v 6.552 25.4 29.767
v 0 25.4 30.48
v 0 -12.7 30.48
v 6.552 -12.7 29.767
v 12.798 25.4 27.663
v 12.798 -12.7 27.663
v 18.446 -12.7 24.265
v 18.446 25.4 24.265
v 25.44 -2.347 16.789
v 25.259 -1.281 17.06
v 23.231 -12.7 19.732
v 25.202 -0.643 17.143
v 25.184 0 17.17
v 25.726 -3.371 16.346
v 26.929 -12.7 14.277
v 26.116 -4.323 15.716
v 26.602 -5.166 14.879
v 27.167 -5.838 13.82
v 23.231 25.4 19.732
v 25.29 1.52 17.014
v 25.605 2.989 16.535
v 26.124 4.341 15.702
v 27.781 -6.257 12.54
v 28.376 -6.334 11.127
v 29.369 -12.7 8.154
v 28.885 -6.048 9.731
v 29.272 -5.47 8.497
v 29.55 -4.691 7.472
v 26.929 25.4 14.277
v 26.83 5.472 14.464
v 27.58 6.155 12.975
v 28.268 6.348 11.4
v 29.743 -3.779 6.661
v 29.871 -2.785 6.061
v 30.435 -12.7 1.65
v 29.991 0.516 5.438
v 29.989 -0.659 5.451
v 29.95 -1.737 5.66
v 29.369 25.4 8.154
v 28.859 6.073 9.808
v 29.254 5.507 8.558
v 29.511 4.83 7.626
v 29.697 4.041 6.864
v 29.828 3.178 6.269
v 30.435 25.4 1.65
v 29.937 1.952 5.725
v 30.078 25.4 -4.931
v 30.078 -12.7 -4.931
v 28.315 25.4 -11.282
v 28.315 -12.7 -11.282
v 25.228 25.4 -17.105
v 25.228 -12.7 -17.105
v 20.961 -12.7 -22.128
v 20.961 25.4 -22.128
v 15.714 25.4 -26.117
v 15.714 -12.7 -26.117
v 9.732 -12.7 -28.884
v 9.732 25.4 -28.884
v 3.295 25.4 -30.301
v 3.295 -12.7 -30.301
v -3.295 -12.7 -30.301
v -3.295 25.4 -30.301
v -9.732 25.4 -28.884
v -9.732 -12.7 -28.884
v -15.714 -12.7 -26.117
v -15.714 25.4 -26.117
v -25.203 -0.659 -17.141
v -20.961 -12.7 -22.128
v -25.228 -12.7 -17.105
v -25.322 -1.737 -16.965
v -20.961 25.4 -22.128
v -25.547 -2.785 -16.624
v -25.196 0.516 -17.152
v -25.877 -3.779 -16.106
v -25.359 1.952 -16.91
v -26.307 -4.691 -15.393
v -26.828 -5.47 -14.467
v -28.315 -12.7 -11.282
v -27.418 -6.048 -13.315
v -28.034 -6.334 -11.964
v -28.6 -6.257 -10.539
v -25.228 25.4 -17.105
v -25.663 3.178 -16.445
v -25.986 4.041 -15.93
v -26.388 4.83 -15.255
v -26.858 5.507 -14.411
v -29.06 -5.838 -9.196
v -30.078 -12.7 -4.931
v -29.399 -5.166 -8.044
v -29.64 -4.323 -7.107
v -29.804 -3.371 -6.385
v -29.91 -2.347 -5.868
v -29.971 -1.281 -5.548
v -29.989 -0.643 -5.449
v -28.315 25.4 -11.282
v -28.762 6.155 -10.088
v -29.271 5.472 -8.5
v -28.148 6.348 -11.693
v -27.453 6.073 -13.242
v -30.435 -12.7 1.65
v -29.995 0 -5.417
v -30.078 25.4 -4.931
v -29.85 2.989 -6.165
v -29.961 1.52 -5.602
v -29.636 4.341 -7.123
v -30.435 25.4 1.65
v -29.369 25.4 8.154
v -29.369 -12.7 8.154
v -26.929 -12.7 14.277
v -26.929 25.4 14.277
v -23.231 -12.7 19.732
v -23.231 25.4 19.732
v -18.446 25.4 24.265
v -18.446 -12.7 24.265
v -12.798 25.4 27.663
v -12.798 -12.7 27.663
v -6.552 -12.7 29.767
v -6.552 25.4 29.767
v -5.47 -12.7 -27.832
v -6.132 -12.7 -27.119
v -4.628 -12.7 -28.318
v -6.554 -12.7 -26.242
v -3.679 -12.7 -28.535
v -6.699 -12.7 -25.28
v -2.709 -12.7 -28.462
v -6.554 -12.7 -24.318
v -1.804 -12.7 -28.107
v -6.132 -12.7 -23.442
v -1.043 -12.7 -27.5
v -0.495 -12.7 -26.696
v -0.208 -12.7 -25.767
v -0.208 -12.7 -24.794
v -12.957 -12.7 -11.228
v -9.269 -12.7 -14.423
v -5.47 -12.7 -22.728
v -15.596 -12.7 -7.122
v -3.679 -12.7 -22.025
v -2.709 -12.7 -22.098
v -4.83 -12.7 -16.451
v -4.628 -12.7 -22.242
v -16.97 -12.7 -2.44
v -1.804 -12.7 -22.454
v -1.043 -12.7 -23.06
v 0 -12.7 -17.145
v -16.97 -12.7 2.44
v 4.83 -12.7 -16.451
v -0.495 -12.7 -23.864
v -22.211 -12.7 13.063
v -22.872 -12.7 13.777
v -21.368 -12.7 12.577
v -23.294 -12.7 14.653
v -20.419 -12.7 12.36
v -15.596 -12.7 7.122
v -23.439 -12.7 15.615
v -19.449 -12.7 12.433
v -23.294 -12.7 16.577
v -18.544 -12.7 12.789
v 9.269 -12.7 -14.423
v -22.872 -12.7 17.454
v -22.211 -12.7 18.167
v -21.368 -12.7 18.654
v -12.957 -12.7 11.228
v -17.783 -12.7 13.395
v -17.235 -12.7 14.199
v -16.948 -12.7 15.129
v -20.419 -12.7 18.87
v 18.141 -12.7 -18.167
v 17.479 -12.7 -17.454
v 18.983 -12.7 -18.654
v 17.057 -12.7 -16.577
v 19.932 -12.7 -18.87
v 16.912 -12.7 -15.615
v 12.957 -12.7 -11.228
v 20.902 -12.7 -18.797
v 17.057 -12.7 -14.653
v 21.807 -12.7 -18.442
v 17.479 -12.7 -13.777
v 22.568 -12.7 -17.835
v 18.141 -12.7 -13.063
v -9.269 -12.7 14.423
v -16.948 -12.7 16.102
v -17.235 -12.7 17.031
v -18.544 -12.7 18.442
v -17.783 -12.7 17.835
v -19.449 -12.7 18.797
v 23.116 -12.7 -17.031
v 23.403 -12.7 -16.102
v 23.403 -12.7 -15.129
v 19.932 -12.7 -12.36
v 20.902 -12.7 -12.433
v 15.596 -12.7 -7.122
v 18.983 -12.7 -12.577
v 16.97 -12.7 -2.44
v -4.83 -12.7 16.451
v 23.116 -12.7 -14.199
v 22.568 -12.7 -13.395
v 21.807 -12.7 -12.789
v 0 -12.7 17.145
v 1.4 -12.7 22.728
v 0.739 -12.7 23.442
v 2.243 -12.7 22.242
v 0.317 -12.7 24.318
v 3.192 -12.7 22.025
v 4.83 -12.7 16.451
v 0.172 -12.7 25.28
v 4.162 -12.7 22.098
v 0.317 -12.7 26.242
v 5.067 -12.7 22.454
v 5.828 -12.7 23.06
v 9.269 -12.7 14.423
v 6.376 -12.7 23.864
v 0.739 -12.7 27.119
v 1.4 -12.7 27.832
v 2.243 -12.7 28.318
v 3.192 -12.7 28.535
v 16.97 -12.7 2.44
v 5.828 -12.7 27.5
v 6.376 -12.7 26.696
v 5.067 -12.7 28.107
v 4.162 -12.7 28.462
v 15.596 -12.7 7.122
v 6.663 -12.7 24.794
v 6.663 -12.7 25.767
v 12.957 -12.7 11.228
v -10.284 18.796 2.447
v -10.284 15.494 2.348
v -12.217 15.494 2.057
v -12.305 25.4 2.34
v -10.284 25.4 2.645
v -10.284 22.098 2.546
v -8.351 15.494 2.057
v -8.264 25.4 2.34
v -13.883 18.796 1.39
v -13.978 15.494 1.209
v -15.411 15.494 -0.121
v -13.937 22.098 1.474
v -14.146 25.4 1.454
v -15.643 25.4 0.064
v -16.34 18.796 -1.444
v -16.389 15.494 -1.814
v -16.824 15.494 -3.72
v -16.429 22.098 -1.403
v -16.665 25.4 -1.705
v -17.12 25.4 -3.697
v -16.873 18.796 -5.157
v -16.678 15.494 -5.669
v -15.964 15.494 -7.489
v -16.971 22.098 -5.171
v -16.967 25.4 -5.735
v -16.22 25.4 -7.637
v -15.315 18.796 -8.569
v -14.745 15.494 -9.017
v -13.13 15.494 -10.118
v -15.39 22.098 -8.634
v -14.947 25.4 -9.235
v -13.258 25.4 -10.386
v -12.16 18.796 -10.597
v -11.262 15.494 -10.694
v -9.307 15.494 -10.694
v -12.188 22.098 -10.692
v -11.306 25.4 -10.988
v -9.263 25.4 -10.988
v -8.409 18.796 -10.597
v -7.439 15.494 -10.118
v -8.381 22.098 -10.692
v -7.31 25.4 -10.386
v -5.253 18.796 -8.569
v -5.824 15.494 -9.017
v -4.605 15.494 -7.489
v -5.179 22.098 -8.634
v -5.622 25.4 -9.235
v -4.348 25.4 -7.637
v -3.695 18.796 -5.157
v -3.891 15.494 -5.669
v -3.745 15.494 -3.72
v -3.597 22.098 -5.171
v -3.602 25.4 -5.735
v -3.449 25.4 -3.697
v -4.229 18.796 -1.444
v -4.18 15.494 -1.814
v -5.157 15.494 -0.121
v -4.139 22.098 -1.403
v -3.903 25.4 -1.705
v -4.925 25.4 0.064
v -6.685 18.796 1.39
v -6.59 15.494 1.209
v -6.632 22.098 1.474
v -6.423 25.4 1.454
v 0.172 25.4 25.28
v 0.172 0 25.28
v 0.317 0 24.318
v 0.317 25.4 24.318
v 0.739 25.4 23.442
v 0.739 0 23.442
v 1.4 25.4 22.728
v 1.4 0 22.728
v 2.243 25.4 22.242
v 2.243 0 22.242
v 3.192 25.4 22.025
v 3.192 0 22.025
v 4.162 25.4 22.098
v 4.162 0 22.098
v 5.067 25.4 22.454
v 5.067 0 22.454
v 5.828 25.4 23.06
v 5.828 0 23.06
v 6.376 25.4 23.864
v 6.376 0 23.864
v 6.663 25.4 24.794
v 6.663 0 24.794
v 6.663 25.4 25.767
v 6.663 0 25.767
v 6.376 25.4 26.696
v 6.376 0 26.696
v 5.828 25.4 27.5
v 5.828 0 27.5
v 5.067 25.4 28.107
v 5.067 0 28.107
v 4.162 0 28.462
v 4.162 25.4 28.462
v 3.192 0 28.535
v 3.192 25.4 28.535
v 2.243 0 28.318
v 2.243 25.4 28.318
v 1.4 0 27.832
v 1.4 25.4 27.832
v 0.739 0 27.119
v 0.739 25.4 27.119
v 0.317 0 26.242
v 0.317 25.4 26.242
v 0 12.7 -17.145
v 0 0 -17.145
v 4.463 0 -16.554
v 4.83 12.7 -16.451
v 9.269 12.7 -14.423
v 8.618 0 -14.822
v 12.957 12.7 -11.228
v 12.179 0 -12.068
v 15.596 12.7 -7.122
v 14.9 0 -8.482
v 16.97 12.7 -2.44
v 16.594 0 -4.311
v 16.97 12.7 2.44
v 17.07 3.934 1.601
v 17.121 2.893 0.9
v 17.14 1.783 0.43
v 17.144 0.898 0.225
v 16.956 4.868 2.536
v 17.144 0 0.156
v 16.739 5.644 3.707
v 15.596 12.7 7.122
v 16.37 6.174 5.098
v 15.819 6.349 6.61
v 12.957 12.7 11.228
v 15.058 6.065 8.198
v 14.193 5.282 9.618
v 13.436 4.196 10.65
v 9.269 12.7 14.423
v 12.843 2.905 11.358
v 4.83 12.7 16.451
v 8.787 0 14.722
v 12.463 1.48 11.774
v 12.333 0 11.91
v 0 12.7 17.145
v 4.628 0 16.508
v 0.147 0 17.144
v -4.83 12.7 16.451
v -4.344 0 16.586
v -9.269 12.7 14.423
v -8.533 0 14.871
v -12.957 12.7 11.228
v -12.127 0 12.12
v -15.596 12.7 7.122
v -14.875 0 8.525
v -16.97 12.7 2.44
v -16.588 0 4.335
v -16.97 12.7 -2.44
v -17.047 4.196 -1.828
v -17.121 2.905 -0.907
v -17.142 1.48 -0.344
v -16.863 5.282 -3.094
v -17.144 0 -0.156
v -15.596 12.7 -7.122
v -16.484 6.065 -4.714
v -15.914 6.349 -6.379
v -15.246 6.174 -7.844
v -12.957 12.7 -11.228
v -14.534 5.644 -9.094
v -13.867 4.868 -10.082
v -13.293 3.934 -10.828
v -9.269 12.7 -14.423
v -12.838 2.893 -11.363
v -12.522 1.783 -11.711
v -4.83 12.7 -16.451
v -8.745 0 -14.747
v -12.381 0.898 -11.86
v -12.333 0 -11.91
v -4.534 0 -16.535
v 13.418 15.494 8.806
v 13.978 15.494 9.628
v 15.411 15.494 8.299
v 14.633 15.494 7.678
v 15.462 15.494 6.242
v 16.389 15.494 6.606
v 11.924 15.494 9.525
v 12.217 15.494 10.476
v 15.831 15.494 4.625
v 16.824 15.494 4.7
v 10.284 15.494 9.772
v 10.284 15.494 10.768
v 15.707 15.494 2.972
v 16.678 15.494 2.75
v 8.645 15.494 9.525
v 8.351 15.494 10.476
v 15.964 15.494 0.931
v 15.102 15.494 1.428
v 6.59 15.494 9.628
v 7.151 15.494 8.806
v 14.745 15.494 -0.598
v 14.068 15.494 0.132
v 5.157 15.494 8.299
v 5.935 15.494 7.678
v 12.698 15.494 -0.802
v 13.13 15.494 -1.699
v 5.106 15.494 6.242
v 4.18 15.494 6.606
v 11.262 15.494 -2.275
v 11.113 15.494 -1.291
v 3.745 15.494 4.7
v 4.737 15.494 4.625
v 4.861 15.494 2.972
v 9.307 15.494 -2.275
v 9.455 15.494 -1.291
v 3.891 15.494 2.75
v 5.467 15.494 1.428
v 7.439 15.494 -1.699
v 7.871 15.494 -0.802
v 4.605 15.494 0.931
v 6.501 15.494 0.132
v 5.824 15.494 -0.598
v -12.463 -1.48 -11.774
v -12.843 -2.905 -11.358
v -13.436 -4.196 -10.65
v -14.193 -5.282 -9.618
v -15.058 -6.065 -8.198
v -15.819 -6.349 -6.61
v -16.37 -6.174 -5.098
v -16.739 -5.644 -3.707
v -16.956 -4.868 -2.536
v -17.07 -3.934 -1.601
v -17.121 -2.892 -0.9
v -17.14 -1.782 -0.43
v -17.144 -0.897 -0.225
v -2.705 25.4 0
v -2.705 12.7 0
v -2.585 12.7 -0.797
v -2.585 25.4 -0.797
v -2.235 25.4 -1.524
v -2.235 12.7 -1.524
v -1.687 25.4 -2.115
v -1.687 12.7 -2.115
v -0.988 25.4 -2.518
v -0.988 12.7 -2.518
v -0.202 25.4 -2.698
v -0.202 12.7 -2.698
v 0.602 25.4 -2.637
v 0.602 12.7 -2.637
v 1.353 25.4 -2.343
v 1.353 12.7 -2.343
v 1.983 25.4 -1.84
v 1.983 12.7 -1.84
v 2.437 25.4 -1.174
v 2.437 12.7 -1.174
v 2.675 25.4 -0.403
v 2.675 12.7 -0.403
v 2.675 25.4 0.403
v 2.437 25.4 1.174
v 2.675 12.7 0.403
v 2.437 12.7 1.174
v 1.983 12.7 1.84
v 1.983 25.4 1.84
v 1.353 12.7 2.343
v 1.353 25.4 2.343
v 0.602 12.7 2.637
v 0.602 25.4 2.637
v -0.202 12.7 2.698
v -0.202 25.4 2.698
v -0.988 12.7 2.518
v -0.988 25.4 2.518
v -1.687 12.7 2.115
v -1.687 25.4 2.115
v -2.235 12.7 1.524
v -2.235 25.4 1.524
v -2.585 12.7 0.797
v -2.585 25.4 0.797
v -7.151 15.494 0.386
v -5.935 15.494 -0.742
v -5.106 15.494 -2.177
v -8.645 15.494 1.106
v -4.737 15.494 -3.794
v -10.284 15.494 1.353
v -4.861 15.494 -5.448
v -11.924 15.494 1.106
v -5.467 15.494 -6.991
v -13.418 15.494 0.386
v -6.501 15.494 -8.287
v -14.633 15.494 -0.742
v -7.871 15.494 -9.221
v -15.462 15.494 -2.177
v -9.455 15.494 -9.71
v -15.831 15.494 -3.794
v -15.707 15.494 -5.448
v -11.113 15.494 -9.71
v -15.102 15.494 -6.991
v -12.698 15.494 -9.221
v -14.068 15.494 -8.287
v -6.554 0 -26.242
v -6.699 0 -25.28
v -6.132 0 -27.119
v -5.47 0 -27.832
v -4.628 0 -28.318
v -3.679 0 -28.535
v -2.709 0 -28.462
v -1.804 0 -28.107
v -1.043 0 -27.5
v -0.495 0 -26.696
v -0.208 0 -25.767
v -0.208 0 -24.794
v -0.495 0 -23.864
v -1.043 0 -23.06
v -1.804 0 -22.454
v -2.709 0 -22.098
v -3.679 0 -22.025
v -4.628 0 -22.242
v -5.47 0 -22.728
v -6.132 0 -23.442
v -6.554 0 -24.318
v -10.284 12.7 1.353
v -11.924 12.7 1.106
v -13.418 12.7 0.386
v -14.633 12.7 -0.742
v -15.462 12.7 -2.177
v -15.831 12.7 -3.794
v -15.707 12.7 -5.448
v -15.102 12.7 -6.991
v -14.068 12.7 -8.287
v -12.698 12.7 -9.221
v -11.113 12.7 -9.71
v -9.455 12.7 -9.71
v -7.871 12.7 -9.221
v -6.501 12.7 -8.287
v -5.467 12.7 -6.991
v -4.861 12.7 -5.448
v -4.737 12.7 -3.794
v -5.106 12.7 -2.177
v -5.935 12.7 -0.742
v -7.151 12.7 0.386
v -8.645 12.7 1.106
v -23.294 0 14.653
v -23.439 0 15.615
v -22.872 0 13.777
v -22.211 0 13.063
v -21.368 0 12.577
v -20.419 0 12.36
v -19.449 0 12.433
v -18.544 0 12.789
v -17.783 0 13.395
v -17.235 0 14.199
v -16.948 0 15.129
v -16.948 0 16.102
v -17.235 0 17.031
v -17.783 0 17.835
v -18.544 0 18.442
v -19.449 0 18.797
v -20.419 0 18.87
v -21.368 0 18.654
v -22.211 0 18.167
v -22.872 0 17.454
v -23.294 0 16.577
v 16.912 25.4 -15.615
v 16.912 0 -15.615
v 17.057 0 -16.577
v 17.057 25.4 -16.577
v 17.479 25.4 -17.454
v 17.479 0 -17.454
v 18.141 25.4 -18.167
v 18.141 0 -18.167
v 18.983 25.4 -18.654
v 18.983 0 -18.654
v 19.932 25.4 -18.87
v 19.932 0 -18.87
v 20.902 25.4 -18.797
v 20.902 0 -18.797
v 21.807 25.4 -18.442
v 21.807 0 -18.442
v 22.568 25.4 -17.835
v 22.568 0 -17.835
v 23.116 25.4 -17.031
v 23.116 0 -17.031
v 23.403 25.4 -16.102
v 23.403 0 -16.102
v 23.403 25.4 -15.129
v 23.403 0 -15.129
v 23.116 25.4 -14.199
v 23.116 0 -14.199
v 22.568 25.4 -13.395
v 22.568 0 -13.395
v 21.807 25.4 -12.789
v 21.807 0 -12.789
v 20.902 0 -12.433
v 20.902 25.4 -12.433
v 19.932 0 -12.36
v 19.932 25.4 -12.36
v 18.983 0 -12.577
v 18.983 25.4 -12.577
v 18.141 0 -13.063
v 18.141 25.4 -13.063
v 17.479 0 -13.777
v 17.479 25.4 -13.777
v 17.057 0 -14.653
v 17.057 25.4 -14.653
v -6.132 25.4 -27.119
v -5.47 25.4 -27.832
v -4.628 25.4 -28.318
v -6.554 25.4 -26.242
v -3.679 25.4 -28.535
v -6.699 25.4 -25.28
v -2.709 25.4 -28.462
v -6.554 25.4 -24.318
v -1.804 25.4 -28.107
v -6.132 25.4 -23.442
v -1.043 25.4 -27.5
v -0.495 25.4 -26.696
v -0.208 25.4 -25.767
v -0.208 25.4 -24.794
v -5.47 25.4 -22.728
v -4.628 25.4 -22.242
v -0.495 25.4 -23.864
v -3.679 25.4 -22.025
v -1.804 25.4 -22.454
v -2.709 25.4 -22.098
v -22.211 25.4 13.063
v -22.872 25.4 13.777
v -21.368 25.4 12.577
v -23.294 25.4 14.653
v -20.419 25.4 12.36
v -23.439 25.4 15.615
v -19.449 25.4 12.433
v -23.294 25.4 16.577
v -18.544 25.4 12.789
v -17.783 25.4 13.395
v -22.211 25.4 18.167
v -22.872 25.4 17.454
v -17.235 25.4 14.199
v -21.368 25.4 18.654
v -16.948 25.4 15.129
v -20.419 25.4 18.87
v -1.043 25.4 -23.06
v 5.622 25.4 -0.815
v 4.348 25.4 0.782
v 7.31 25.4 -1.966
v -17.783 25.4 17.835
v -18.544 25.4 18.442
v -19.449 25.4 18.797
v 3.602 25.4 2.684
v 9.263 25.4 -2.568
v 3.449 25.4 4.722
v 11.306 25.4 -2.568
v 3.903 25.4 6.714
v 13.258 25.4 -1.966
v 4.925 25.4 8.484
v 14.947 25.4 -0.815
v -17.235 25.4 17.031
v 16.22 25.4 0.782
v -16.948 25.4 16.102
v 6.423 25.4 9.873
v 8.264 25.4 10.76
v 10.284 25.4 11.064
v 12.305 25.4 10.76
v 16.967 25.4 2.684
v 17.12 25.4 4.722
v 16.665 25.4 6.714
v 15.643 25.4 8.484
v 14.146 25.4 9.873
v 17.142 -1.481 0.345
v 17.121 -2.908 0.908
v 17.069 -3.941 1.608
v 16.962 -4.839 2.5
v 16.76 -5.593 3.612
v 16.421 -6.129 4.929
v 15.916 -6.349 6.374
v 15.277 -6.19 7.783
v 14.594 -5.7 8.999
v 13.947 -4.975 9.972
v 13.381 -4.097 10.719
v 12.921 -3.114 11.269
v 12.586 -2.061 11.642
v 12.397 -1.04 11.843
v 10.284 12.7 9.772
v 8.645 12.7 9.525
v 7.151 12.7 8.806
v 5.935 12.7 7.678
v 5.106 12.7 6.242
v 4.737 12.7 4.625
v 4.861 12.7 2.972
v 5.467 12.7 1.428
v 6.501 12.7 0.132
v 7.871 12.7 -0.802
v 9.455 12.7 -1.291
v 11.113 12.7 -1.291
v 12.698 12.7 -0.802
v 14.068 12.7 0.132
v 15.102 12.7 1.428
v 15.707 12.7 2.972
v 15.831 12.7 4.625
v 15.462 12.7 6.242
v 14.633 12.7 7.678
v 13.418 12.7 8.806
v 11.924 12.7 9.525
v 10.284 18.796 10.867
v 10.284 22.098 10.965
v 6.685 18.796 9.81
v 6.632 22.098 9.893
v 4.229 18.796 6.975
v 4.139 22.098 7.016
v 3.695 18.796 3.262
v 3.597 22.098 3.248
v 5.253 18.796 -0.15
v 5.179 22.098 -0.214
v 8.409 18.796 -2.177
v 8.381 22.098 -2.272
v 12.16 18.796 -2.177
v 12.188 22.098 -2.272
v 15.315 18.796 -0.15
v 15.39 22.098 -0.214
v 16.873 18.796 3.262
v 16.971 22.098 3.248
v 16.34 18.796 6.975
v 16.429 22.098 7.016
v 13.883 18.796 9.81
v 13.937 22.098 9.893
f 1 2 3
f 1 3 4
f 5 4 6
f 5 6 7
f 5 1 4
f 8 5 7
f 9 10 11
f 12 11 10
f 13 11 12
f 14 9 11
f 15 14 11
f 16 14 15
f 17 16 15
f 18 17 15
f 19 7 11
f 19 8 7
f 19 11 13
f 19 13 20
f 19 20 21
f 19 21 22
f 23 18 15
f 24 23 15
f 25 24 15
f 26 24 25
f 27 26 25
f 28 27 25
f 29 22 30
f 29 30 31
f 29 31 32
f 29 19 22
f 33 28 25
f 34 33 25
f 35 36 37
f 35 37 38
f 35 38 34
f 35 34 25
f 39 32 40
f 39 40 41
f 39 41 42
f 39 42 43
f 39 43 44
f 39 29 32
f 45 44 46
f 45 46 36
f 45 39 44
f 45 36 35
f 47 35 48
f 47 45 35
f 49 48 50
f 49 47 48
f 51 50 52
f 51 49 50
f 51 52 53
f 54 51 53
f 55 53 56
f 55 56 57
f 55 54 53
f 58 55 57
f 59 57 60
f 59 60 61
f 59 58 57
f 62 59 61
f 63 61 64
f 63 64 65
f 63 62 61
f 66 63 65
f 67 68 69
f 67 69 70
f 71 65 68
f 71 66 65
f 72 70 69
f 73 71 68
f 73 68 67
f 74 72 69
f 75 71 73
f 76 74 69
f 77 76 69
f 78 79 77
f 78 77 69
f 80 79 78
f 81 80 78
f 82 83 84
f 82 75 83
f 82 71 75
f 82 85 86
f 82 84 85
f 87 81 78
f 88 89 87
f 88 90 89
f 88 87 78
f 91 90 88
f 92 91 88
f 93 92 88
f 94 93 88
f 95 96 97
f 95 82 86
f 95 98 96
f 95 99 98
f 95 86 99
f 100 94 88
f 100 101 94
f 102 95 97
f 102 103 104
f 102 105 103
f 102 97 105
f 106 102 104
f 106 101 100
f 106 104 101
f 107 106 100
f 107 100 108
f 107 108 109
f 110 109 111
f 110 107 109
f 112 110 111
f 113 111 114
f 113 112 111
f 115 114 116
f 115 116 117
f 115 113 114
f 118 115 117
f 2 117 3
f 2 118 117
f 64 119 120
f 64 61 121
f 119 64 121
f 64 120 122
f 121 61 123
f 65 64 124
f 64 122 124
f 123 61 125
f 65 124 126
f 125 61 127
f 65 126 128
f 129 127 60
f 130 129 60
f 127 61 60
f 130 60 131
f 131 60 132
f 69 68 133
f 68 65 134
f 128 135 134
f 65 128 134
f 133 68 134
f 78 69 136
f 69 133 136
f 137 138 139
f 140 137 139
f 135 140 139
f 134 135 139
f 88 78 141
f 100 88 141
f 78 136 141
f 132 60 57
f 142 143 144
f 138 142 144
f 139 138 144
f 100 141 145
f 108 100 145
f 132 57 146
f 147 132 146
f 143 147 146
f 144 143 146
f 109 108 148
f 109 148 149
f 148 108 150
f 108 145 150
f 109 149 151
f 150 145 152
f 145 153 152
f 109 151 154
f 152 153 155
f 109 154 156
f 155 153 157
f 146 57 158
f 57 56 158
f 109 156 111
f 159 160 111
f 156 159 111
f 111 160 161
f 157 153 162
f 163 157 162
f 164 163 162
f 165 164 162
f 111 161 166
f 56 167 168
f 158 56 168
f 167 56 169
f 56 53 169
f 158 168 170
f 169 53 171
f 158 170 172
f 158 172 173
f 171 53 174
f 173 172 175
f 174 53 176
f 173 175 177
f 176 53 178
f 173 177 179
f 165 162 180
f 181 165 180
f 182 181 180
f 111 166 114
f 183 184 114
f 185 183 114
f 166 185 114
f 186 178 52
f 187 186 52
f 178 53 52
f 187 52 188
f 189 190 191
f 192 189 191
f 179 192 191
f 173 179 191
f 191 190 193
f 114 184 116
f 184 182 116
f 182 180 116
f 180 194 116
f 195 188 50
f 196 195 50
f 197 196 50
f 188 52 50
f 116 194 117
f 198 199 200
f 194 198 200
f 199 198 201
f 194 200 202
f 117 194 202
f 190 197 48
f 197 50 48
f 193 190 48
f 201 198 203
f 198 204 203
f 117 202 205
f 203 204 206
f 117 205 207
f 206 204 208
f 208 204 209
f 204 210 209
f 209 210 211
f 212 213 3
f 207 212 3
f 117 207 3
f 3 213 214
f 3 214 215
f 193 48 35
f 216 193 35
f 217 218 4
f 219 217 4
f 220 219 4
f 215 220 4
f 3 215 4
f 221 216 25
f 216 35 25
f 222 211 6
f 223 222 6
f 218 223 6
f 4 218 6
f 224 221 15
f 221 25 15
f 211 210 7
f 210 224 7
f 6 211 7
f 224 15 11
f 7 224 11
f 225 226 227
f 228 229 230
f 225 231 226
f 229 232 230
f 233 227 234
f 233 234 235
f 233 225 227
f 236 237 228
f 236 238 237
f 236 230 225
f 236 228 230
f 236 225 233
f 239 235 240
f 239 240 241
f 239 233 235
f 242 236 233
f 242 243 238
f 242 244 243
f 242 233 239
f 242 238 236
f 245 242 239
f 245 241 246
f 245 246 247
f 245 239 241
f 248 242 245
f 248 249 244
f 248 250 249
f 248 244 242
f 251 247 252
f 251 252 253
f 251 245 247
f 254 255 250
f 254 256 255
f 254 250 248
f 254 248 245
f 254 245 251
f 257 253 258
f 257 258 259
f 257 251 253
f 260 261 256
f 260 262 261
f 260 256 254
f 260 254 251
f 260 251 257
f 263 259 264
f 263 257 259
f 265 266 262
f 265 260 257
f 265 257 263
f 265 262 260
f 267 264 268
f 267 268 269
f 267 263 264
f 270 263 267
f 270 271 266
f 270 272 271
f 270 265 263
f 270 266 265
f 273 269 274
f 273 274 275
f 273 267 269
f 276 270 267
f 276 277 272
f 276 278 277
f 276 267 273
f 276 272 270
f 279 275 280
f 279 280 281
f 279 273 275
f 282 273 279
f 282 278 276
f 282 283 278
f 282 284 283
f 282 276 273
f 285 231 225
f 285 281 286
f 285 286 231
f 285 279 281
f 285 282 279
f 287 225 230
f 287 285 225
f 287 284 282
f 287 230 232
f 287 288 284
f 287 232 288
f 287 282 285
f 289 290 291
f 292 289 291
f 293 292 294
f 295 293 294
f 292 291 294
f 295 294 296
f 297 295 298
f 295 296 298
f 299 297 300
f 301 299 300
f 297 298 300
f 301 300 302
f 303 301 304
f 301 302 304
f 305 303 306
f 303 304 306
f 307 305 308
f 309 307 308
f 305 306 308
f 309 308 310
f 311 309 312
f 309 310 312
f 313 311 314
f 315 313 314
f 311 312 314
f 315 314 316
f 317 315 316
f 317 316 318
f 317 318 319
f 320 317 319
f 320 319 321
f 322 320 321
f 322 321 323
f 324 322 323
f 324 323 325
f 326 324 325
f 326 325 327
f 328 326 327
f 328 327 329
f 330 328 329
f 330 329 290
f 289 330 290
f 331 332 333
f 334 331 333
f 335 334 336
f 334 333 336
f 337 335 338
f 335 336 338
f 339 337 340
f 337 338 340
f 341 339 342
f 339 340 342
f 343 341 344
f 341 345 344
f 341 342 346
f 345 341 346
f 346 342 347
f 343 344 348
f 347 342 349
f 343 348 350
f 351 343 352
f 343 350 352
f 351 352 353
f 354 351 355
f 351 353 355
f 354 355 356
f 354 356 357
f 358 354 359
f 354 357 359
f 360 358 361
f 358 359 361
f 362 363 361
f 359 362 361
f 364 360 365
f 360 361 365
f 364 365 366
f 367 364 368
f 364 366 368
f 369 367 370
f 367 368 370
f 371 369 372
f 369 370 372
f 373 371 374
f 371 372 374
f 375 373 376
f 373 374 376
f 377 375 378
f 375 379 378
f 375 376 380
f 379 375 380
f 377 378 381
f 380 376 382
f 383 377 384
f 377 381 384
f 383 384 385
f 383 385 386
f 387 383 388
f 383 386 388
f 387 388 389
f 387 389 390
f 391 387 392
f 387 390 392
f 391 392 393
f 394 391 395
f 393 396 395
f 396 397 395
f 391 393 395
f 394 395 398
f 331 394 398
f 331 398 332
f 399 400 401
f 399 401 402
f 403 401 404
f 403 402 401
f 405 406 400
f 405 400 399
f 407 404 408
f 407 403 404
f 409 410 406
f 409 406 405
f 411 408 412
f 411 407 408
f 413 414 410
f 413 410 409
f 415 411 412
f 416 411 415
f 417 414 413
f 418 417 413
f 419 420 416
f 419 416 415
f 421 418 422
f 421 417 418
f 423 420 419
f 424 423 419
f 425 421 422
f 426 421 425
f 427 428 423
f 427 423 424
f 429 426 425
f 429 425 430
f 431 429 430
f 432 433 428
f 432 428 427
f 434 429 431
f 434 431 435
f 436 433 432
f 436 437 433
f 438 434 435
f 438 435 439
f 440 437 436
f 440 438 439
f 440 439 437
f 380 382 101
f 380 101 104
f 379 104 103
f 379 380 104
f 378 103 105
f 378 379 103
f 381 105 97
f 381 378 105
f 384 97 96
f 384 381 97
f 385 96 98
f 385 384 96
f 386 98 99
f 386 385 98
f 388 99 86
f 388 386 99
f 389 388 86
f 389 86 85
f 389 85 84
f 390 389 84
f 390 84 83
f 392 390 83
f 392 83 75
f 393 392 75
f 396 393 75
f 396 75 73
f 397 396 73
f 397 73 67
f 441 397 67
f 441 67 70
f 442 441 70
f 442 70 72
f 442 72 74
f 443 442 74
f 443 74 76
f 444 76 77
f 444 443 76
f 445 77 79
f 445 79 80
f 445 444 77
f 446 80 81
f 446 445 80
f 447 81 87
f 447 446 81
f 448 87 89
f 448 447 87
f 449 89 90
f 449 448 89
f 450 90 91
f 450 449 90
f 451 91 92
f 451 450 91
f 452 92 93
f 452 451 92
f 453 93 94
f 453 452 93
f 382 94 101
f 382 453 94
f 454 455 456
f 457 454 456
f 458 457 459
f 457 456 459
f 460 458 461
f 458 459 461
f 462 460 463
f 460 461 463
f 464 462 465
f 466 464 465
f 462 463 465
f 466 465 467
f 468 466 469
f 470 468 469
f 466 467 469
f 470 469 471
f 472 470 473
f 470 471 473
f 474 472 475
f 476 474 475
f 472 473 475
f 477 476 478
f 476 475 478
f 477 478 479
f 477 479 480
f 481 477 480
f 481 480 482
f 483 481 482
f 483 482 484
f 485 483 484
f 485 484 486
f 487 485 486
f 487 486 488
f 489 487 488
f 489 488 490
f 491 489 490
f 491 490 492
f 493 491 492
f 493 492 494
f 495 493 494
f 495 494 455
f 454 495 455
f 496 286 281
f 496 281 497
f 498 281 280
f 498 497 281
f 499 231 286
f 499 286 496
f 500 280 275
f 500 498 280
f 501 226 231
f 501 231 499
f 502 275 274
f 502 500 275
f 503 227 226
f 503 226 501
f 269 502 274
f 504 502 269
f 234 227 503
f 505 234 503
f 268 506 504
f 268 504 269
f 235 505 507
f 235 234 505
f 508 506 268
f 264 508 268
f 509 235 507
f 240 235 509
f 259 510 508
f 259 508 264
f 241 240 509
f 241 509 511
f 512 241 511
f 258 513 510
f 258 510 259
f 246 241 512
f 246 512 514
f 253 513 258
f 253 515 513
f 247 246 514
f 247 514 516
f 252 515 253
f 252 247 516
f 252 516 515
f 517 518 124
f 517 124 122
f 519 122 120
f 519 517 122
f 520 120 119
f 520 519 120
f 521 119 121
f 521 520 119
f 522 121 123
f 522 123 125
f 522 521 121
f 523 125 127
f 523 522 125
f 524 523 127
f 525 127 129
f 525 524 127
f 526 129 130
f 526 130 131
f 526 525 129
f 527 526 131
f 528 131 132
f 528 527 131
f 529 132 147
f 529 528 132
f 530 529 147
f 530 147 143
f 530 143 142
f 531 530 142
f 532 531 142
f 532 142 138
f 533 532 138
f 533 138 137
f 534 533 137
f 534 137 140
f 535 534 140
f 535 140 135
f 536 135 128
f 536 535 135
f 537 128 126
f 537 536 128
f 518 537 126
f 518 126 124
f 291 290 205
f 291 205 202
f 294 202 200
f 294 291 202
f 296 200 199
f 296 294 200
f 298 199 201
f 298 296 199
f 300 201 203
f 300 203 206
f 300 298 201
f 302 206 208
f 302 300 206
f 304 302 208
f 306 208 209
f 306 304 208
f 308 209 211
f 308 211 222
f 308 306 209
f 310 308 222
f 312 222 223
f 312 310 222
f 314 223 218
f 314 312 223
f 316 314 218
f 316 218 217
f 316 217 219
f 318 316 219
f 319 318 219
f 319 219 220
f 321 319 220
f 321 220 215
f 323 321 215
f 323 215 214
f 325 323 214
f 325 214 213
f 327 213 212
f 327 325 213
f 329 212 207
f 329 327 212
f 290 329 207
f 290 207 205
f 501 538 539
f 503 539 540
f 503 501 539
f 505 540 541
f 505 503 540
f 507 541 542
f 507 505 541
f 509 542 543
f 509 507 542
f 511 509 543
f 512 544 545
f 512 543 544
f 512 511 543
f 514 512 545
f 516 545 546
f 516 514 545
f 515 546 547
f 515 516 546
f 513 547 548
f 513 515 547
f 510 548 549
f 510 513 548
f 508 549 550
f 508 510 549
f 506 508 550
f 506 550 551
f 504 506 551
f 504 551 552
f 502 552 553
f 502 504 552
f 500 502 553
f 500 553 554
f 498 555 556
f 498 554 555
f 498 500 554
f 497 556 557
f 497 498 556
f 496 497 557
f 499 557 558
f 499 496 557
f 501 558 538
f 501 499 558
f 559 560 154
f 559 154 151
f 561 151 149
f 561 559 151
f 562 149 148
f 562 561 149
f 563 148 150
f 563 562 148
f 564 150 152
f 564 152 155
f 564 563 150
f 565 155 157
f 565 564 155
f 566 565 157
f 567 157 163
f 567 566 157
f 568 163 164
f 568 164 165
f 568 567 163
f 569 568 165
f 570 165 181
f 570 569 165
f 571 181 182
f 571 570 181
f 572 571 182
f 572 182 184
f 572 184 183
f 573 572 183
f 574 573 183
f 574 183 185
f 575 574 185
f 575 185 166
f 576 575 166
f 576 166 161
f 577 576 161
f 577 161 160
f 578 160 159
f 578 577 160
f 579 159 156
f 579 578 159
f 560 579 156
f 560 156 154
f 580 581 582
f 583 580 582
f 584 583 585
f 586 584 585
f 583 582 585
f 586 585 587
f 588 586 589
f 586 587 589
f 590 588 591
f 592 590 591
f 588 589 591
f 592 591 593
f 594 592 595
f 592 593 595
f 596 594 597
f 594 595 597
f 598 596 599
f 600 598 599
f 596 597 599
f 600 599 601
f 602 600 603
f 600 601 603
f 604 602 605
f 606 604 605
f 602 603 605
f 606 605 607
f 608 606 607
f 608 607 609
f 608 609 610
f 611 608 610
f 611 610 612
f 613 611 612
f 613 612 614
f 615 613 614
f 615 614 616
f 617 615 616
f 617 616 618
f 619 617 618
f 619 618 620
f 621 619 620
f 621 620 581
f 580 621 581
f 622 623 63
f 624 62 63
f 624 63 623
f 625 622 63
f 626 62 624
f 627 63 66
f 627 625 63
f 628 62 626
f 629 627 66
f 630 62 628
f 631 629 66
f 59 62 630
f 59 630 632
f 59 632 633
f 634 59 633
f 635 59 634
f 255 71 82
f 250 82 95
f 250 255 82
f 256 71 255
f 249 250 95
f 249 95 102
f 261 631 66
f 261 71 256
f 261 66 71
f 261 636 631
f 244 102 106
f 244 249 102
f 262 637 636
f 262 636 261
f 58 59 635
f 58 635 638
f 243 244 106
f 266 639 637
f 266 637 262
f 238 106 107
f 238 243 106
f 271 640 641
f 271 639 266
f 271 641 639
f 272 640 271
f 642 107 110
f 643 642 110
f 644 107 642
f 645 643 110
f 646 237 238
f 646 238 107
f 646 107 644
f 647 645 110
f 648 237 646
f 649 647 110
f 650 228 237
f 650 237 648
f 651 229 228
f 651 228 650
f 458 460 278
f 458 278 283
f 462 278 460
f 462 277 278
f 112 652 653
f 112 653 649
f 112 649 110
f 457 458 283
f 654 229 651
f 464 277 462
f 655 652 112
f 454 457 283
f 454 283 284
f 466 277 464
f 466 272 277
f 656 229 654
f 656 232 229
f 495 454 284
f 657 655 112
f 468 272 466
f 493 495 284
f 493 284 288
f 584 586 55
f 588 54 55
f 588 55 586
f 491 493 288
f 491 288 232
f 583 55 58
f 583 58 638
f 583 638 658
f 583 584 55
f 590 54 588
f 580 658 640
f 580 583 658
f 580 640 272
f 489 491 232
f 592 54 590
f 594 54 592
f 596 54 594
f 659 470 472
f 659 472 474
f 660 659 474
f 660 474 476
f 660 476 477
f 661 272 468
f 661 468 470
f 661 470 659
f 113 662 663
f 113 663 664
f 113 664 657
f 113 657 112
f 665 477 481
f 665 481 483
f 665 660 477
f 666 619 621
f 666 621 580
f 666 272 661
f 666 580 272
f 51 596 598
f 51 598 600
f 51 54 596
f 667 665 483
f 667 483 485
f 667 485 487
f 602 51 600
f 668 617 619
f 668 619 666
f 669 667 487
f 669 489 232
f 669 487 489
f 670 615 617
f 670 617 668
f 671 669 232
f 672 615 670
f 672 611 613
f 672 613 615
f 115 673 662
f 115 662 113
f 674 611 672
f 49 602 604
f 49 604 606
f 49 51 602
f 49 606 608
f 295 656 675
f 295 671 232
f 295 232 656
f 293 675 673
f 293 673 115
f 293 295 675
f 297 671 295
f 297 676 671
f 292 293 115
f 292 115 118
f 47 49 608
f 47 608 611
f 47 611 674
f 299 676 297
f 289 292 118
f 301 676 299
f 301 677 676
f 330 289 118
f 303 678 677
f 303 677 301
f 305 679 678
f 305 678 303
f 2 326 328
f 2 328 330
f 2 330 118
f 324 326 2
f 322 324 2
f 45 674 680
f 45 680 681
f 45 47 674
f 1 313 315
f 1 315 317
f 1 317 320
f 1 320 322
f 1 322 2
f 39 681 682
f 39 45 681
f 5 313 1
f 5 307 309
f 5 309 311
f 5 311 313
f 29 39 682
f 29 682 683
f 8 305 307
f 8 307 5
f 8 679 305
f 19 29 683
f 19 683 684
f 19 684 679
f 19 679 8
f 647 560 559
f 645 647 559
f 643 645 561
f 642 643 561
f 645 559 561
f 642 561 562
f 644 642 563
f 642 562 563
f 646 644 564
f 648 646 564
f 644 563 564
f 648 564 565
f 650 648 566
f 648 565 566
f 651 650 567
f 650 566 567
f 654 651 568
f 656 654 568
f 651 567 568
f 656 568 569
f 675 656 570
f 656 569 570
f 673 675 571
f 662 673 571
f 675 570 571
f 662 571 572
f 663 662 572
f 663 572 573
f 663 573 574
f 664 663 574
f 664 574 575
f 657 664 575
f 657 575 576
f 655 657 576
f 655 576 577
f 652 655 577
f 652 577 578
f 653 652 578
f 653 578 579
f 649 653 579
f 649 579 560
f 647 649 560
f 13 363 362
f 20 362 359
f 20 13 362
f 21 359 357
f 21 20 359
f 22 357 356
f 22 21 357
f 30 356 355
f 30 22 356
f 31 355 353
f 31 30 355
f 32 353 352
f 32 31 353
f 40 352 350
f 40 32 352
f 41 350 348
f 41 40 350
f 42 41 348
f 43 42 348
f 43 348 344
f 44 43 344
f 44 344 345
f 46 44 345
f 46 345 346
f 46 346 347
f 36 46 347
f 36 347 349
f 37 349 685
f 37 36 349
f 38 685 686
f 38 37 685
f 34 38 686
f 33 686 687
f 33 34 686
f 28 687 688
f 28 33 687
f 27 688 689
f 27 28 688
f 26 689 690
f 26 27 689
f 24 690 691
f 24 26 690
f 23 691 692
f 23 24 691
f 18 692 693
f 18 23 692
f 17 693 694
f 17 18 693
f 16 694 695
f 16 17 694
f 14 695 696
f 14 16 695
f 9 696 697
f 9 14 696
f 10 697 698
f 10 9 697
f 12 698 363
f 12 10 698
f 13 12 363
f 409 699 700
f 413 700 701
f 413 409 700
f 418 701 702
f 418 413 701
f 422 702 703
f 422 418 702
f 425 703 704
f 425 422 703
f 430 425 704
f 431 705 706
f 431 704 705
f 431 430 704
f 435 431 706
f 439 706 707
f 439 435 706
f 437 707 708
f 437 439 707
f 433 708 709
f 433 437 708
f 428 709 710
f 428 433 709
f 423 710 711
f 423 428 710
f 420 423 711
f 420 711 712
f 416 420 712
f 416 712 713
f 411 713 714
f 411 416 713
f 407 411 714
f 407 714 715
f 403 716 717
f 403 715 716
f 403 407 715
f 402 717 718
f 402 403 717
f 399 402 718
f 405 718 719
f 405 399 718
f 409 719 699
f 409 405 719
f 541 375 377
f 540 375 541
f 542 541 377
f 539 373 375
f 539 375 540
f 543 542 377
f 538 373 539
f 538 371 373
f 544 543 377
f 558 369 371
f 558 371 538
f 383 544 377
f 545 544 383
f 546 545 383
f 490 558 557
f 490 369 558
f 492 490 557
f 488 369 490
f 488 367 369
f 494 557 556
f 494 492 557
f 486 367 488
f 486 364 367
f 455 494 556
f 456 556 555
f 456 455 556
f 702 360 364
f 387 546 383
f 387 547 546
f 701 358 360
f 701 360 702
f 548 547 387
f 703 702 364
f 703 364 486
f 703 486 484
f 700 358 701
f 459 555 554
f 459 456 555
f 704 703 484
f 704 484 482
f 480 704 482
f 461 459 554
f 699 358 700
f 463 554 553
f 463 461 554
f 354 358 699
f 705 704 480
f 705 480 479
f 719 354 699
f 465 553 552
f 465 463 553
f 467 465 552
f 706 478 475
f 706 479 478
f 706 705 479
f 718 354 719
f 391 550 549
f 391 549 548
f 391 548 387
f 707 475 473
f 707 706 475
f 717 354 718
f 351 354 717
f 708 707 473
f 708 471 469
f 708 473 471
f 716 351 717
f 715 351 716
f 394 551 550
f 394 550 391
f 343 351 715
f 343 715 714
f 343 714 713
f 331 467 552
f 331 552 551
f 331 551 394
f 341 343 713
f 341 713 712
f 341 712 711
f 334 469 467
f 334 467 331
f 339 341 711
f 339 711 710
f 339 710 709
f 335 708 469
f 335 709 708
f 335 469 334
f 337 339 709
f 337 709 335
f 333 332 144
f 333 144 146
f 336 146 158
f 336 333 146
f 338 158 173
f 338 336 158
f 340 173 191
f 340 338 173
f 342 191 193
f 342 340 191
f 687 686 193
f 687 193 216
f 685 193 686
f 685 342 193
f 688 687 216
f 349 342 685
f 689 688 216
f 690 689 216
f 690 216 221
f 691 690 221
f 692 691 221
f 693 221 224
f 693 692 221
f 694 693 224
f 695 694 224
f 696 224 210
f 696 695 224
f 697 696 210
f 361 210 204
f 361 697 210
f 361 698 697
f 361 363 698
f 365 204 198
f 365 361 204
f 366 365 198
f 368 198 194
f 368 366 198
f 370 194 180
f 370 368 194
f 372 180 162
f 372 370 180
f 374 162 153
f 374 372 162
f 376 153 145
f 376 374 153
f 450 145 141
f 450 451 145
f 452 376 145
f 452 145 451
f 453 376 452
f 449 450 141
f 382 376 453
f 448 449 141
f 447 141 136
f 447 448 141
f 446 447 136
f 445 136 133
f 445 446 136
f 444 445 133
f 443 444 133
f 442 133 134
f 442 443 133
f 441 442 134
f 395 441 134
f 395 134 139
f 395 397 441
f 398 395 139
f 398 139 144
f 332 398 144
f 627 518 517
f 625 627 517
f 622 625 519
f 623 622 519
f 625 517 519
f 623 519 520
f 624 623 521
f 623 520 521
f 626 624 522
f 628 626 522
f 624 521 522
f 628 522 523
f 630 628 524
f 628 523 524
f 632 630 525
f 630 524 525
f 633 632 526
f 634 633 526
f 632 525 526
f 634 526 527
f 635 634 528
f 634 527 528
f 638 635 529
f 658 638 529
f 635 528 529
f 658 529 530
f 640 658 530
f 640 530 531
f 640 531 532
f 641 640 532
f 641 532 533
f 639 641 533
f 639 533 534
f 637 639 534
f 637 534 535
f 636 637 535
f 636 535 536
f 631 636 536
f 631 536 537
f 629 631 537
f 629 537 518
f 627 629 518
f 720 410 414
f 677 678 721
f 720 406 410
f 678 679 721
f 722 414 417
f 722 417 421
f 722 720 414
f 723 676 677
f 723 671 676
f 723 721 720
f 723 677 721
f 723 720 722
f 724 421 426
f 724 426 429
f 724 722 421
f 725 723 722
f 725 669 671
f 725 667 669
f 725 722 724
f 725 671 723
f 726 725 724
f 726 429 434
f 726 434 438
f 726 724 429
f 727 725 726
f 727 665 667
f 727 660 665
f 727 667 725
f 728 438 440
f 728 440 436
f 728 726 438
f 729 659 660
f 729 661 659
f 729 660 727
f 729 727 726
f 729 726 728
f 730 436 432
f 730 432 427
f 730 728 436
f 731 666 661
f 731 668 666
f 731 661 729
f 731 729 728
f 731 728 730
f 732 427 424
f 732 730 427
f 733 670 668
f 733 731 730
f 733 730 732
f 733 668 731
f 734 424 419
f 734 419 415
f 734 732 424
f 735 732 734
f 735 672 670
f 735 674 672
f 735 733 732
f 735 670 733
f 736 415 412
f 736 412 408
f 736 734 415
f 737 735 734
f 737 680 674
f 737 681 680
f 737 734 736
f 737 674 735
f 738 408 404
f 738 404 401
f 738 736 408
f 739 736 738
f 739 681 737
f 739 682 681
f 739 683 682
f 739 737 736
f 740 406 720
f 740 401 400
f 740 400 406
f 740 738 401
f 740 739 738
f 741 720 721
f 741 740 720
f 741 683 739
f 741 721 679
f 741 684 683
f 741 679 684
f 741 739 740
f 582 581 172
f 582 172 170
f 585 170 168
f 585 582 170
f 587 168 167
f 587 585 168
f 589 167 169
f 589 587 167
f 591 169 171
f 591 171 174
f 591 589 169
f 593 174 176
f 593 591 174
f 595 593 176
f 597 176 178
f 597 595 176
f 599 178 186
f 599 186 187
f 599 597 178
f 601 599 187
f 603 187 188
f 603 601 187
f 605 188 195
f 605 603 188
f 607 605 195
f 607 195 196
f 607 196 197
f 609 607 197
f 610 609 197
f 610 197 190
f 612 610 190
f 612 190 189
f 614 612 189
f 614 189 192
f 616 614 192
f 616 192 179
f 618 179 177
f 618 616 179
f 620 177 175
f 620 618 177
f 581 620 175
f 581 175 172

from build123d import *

# Parameters (mm, degrees)
SKETCH1_R                         = 30.48
BOSS_EXTRUDE1_DEPTH               = 25.4
SKETCH7_R                         = 11.43
CUT_EXTRUDE2_DEPTH                = 12.7
F_1_4_CLEARANCE_HOLE1_D           = 6.5278
F_1_4_28_TAPPED_HOLE1_D           = 5.4102
F_1_4_NPT_TAPPED_HOLE1_AT_2_COUNT = 2
F_1_4_NPT_TAPPED_HOLE1_AT_2_PITCH = 22.225
SKETCH13_R                        = 17.145
CUT_EXTRUDE3_DEPTH                = 12.7
MOVE_FACE1_BY                     = 12.7
CUT_EXTRUDE4_DEPTH                = 51.032197633
CUT_EXTRUDE4_DEPTH_BACK           = 51.032197633
SKETCH17_R                        = 6.35


with BuildPart() as part:
    # Sketch1 → Boss-Extrude1 (new body)
    with BuildSketch(Plane(origin=(0, 0, 0), x_dir=(1, 0, 0), z_dir=(0, 1, 0))):
        with Locations(Location((0, 0, 0), (0, 0, 270))):
            Circle(SKETCH1_R)
    extrude(amount=BOSS_EXTRUDE1_DEPTH)

    # Sketch7 → Cut-Extrude2 (cut)
    with BuildSketch(Plane.XZ):
        with Locations(Location((0, 0, 0), (0, 0, 270))):
            Circle(SKETCH7_R)
    extrude(amount=-CUT_EXTRUDE2_DEPTH, mode=Mode.SUBTRACT)

    # 1/4 Clearance Hole1 (through all)
    with Locations(Plane(origin=(0, 25.4, 0), x_dir=(1, 0, 0), z_dir=(0, 1, 0))):
        with Locations((20.175514493, 15.615257641), (3.435452557, -25.280136906), (-3.435452557, 25.280136906), (-20.175514493, -15.615257641)):
            Hole(F_1_4_CLEARANCE_HOLE1_D / 2)

    # 1/4-28 Tapped Hole1 (through all)
    with Locations(Plane(origin=(0, 25.4, 0), x_dir=(1, 0, 0), z_dir=(0, 1, 0))):
        with Locations((0, 0)):
            Hole(F_1_4_28_TAPPED_HOLE1_D / 2)

    # Sketch12 → 1/4 NPT Tapped Hole1 (revolve, cut)
    with BuildSketch(Plane(origin=(-10.284247774, 25.4, -4.20973918), x_dir=(0, 0, 1), z_dir=(1, 0, 0))):
        Polygon((0, 0), (0, 25.4), (5.5626, 25.4), (5.5626, 9.906), (6.557984794, 9.906), (6.8545837, 0), align=None)
    f_1_4_npt_tapped_hole1 = revolve(axis=Axis((-10.284247774, 31.75, -4.20973918), (0, -1, 0)), mode=Mode.SUBTRACT)

    # 1/4 NPT Tapped Hole1 at 2: 1/4 NPT Tapped Hole1 ×2
    with Locations(*[Vector(0.9254666163685323, 0, 0.3788291725664483) * (i * F_1_4_NPT_TAPPED_HOLE1_AT_2_PITCH) for i in range(1, F_1_4_NPT_TAPPED_HOLE1_AT_2_COUNT)]):
        add(f_1_4_npt_tapped_hole1, mode=Mode.SUBTRACT)

    # Sketch13 → Cut-Extrude3 (cut)
    with BuildSketch(Plane.XZ):
        with Locations(Location((0, 0, 0), (0, 0, 270))):
            Circle(SKETCH13_R)
    extrude(amount=-CUT_EXTRUDE3_DEPTH, mode=Mode.SUBTRACT)

    # Move Face1: a face moved outward by 12.7
    extrude(part.faces().sort_by_distance((0, 0, 24.384))[0], amount=MOVE_FACE1_BY, dir=(0, -1, 0))

    # Sketch17 → Cut-Extrude4 (cut, two sides: drawn at the far end of the back side and taken through both)
    with BuildSketch(Plane(origin=(0, 0, 0), x_dir=(-0.37882917256642434, 0, 0.9254666163685421), z_dir=(-0.9254666163685421, 0, -0.37882917256642434)).offset(-CUT_EXTRUDE4_DEPTH_BACK)):
        Circle(SKETCH17_R)
    extrude(amount=CUT_EXTRUDE4_DEPTH + CUT_EXTRUDE4_DEPTH_BACK, mode=Mode.SUBTRACT)


solid = part.part
